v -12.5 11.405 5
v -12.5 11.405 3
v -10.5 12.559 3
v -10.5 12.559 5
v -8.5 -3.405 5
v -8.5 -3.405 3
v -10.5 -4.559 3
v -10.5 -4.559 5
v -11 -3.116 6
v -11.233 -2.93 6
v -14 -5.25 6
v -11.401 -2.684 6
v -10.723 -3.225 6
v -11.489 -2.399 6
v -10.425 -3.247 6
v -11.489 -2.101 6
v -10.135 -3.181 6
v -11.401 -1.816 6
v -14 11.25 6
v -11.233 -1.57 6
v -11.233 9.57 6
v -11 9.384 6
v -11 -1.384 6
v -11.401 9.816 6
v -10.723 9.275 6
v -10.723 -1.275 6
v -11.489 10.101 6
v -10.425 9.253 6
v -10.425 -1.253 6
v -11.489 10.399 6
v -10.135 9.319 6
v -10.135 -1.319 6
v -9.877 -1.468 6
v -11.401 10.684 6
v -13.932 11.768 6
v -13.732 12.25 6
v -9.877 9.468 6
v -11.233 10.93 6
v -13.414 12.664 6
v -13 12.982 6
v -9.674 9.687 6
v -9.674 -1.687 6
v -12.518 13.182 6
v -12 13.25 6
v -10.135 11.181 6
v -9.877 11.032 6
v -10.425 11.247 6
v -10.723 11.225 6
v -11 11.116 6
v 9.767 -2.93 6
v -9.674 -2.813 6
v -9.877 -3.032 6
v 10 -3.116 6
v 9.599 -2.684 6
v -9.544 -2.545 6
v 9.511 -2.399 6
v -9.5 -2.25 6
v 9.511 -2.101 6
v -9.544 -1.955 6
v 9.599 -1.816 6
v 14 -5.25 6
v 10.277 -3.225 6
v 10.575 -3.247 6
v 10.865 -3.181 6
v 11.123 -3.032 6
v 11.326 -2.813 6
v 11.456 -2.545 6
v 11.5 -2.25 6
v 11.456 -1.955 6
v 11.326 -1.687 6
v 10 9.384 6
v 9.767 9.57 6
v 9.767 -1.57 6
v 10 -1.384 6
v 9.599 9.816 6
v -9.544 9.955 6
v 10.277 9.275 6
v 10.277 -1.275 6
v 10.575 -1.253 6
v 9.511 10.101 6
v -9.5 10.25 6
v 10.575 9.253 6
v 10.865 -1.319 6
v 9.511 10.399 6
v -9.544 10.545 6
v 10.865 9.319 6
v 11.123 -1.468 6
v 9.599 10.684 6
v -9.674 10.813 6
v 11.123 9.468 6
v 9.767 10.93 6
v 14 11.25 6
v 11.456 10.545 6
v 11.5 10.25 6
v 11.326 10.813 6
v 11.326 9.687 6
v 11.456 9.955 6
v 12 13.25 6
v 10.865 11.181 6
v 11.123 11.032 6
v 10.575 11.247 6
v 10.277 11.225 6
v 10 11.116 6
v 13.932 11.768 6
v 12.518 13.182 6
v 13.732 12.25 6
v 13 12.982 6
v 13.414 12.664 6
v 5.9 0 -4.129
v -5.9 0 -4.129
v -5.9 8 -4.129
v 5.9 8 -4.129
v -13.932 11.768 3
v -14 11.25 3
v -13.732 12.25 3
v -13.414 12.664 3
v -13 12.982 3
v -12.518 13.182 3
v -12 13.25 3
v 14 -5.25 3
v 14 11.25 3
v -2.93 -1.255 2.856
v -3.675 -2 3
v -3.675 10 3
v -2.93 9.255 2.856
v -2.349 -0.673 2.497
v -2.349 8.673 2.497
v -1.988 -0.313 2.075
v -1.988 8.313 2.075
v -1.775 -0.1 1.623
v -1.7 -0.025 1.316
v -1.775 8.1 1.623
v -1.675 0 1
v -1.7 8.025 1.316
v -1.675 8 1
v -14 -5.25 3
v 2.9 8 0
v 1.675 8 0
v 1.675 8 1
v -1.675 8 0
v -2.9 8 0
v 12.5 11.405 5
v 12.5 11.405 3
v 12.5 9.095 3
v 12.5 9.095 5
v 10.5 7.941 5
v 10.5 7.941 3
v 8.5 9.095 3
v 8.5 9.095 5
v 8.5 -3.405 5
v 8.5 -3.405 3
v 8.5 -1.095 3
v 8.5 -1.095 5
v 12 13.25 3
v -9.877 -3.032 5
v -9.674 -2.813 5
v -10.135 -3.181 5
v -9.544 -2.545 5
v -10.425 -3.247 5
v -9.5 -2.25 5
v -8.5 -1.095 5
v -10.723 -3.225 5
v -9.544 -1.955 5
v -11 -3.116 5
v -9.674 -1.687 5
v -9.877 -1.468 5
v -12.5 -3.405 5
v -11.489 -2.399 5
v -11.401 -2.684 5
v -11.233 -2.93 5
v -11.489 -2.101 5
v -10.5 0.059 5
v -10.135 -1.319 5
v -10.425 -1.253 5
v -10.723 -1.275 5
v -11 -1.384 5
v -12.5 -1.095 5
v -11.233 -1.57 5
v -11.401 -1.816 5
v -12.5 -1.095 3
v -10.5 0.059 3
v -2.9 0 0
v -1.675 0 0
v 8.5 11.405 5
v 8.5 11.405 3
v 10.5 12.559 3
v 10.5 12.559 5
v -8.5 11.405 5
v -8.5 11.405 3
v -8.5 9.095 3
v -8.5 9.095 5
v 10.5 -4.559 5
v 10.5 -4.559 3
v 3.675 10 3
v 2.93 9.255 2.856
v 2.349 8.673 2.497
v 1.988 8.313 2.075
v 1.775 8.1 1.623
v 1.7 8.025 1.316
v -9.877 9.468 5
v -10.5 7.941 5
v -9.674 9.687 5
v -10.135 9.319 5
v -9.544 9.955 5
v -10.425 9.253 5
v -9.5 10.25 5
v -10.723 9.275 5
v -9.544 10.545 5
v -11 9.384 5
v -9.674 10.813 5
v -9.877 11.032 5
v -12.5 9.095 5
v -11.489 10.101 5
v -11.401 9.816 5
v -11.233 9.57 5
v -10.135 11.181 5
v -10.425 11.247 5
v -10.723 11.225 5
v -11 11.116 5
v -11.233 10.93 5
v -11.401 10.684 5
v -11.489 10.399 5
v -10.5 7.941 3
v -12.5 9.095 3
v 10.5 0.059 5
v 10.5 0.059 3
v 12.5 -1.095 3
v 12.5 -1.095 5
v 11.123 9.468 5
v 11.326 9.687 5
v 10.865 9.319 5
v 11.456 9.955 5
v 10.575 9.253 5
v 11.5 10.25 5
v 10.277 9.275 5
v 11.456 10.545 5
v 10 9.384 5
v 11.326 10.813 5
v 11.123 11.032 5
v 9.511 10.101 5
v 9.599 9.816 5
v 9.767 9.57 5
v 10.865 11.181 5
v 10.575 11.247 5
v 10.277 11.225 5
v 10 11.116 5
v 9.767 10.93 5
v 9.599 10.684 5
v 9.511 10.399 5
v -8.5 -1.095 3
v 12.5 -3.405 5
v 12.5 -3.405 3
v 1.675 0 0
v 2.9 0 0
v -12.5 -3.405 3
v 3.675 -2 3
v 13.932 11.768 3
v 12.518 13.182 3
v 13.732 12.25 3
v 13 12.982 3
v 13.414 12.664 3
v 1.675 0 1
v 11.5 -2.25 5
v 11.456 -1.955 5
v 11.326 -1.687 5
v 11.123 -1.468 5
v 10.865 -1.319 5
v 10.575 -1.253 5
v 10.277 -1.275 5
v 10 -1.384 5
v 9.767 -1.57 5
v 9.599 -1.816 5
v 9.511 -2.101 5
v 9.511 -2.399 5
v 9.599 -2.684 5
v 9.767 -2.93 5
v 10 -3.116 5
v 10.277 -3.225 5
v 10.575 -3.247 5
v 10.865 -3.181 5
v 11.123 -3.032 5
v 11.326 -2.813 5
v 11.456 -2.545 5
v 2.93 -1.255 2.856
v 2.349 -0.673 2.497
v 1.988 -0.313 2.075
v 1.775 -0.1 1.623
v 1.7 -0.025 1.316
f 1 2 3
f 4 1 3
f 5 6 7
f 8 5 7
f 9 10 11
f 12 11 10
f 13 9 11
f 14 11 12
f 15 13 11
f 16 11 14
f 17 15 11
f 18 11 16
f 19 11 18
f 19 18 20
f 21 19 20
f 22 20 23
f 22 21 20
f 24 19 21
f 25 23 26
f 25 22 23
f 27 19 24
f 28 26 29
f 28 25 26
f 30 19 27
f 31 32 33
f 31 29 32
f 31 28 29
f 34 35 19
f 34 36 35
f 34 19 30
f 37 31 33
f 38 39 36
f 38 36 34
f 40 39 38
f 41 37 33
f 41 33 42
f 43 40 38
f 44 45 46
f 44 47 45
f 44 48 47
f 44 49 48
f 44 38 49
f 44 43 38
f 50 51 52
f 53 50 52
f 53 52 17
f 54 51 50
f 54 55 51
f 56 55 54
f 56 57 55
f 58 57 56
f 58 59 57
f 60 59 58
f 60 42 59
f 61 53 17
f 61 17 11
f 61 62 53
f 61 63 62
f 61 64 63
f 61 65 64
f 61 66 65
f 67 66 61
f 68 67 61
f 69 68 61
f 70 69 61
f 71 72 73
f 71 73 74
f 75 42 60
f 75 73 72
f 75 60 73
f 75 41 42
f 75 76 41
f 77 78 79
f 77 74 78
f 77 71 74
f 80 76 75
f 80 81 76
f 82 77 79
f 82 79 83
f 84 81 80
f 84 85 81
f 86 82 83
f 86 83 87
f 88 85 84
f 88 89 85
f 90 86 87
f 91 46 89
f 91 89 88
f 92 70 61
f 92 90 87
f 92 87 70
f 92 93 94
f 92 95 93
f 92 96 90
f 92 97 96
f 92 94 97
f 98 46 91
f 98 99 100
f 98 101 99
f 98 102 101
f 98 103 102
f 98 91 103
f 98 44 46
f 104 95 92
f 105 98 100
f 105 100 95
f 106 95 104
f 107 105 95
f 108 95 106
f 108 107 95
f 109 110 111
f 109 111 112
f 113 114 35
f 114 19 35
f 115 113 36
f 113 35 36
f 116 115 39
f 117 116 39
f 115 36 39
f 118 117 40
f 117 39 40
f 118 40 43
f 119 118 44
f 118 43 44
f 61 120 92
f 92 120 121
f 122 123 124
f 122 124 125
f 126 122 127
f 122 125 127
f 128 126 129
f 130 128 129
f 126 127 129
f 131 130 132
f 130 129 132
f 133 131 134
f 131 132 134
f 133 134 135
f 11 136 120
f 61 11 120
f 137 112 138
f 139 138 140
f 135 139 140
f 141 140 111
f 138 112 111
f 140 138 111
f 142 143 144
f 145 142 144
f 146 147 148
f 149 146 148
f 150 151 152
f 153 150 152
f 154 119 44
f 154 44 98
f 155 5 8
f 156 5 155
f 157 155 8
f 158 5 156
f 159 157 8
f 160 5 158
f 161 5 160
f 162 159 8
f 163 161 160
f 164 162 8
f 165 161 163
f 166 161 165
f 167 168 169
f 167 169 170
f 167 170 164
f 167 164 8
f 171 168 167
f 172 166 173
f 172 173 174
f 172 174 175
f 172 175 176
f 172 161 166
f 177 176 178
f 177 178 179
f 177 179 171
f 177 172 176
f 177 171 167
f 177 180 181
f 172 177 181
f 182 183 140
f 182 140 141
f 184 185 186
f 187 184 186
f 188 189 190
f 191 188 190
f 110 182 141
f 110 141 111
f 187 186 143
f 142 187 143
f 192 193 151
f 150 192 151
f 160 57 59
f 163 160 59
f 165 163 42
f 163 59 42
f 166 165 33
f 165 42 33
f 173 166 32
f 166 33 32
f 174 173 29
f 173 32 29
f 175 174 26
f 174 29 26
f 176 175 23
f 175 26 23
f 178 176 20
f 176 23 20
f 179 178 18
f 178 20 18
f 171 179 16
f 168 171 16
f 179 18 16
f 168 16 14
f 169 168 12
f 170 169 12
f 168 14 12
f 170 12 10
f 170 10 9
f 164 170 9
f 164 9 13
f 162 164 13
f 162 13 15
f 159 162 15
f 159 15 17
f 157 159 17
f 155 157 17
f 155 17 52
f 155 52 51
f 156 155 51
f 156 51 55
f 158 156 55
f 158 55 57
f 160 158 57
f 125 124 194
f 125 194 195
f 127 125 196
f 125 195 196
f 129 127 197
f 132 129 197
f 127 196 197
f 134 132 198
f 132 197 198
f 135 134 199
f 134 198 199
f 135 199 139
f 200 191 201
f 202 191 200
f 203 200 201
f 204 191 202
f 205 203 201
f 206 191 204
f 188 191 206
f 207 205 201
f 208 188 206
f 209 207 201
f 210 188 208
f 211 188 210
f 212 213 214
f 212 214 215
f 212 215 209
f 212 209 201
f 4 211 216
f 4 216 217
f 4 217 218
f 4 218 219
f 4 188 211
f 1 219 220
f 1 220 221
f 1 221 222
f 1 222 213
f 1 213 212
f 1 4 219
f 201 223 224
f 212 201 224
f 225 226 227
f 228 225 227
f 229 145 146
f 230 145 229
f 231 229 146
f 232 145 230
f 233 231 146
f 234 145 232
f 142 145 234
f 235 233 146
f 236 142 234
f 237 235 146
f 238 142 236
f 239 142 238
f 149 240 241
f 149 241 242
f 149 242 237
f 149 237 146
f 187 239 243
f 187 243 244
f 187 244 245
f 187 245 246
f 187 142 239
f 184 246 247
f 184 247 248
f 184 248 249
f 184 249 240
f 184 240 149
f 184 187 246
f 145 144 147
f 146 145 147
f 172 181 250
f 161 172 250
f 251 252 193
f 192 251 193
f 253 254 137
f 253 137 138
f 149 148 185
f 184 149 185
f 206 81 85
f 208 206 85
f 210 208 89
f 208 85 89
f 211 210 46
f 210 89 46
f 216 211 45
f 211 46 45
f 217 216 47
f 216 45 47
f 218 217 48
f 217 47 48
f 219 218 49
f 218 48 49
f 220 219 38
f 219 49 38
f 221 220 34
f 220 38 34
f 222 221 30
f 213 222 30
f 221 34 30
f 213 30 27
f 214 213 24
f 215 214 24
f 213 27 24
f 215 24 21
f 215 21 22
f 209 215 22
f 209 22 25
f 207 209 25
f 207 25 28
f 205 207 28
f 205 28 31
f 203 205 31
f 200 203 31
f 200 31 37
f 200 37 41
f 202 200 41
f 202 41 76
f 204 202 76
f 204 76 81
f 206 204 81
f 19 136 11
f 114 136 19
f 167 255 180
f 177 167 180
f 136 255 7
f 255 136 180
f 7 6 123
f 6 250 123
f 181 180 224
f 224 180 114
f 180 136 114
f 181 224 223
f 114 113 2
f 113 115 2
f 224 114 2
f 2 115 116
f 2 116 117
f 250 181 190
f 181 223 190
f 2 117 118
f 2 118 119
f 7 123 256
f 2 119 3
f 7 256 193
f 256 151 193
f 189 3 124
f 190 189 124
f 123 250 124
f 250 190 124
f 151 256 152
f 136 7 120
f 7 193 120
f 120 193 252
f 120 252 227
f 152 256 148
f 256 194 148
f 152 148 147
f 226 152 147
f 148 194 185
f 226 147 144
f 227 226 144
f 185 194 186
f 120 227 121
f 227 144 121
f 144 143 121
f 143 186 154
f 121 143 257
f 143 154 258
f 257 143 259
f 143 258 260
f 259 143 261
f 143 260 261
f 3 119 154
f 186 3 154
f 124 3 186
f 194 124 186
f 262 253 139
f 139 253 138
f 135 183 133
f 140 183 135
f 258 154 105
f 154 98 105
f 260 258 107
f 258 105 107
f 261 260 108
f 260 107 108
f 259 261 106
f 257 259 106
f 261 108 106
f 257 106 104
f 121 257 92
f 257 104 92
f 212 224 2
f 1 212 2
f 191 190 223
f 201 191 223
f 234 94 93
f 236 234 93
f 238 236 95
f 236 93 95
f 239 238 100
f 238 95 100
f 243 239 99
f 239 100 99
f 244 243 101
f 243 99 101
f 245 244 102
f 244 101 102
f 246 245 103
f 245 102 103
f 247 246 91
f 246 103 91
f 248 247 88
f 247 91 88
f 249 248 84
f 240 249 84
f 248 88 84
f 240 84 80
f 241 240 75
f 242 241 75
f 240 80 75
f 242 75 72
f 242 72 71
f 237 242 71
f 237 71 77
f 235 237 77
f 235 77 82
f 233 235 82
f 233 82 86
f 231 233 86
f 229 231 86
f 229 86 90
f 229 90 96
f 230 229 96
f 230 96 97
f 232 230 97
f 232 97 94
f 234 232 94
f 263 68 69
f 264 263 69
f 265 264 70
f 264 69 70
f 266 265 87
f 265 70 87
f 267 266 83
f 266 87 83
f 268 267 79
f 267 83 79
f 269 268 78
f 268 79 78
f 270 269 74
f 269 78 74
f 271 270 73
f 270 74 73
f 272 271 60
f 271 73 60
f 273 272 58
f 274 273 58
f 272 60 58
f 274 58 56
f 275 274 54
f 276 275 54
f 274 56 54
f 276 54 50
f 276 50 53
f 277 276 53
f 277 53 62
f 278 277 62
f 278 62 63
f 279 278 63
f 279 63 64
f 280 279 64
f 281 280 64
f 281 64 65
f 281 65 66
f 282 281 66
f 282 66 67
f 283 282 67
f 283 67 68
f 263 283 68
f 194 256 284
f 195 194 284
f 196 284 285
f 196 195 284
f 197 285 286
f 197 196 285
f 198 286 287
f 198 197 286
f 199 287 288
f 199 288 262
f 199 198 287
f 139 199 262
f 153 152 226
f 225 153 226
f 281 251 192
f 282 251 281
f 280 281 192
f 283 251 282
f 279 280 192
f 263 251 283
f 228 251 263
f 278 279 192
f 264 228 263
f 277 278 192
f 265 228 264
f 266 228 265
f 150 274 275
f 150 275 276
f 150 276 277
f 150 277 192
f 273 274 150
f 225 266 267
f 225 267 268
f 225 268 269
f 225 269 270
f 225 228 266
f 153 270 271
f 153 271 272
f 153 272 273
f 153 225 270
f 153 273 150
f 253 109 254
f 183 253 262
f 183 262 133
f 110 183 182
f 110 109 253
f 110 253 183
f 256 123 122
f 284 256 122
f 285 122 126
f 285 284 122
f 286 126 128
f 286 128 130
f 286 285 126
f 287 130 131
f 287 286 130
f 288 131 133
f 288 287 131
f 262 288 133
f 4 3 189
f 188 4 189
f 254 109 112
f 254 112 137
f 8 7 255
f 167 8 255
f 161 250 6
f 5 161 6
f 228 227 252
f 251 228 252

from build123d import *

# Parameters (mm, degrees)
DOVETAIL_DEPTH     = 8
SKETCH2_W          = 3.35034124
SKETCH2_H          = 8
STEM_DEPTH         = 3
SKETCH3_W          = 28
SKETCH3_H          = 18.5
CAMERA_PLATE_DEPTH = 3
FILLET1_R          = 2
SKETCH4_R          = 1
SCREW_HOLES_DEPTH  = 3
NUT_HOLES_DEPTH    = 2
FILLET2_R          = 2


with BuildPart() as part:
    # Sketch1 → Dovetail (new body)
    with BuildSketch(Plane(origin=(0, 0, 0), x_dir=(1, 0, 0), z_dir=(0, 1, 0))):
        Polygon((-2.9, 0), (-5.9, 4.129145761), (5.9, 4.129145761), (2.9, 0), align=None)
    extrude(amount=DOVETAIL_DEPTH)

    # Sketch2 → Stem (add)
    with BuildSketch(Plane.XY):
        with Locations((0, 4)):
            Rectangle(SKETCH2_W, SKETCH2_H)
    extrude(amount=STEM_DEPTH)

    # Sketch3 → Camera Plate (add)
    with BuildSketch(Plane.XY.offset(3)):
        with Locations((0, 4)):
            Rectangle(SKETCH3_W, SKETCH3_H)
    extrude(amount=CAMERA_PLATE_DEPTH)

    # Fillet1
    fillet1_edges = [part.edges().sort_by_distance(p)[0] for p in [
        (1.67517062, 4, 3),
        (0, 8, 3),
        (-1.67517062, 4, 3),
        (0, 0, 3),
    ]]
    fillet(fillet1_edges, radius=FILLET1_R)

    # Sketch4 → Screw Holes (cut)
    with BuildSketch(Plane.XY.offset(6)):
        with Locations((-10.5, 10.25)):
            Circle(SKETCH4_R)
        with Locations((10.5, 10.25)):
            Circle(SKETCH4_R)
        with Locations((10.5, -2.25)):
            Circle(SKETCH4_R)
        with Locations((-10.5, -2.25)):
            Circle(SKETCH4_R)
    extrude(amount=-SCREW_HOLES_DEPTH, mode=Mode.SUBTRACT)

    # Sketch5 → Nut Holes (cut)
    with BuildSketch(Plane(origin=(0, 0, 3), x_dir=(-1, 0, 0), z_dir=(0, 0, -1))):
        Polygon((-10.5, 12.559401077), (-12.5, 11.404700538), (-12.5, 9.095299462), (-10.5, 7.940598923), (-8.5, 9.095299462), (-8.5, 11.404700538), align=None)
        Polygon((10.5, 12.559401077), (8.5, 11.404700538), (8.5, 9.095299462), (10.5, 7.940598923), (12.5, 9.095299462), (12.5, 11.404700538), align=None)
        Polygon((-10.5, -4.559401077), (-8.5, -3.404700538), (-8.5, -1.095299462), (-10.5, 0.059401077), (-12.5, -1.095299462), (-12.5, -3.404700538), align=None)
        Polygon((10.5, -4.559401077), (12.5, -3.404700538), (12.5, -1.095299462), (10.5, 0.059401077), (8.5, -1.095299462), (8.5, -3.404700538), align=None)
    extrude(amount=-NUT_HOLES_DEPTH, mode=Mode.SUBTRACT)

    # Fillet2
    fillet2_edges = [part.edges().sort_by_distance(p)[0] for p in [
        (14, 13.25, 4.5),
        (-14, 13.25, 4.5),
    ]]
    fillet(fillet2_edges, radius=FILLET2_R)


solid = part.part
